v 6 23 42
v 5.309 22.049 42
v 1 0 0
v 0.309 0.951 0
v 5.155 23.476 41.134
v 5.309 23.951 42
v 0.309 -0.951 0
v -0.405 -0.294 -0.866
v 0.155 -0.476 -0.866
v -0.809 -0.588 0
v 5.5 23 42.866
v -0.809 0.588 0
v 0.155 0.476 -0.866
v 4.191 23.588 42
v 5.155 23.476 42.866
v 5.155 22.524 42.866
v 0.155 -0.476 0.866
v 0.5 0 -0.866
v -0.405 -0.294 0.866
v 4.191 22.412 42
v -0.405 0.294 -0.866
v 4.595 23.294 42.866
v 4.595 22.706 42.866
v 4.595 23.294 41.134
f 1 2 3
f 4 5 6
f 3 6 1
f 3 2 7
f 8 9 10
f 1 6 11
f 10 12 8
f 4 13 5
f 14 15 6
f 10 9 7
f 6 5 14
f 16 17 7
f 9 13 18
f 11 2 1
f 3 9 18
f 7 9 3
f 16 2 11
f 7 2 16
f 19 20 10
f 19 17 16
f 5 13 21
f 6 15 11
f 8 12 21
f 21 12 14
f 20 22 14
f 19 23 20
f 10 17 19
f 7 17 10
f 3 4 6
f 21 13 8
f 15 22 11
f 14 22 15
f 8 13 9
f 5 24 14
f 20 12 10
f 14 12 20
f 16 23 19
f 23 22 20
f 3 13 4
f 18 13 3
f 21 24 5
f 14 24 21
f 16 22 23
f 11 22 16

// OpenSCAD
/// Stackoverflow example module for a line
/// https://stackoverflow.com/questions/49533350/is-that-possible-to-draw-a-line-using-openscad-by-joining-different-points

module line(start, end, thickness = 1) {
    hull() {
        translate(start) sphere(thickness);
        translate(end) sphere(thickness);
    }
}

line([0,0,0], [5,23,42]);
